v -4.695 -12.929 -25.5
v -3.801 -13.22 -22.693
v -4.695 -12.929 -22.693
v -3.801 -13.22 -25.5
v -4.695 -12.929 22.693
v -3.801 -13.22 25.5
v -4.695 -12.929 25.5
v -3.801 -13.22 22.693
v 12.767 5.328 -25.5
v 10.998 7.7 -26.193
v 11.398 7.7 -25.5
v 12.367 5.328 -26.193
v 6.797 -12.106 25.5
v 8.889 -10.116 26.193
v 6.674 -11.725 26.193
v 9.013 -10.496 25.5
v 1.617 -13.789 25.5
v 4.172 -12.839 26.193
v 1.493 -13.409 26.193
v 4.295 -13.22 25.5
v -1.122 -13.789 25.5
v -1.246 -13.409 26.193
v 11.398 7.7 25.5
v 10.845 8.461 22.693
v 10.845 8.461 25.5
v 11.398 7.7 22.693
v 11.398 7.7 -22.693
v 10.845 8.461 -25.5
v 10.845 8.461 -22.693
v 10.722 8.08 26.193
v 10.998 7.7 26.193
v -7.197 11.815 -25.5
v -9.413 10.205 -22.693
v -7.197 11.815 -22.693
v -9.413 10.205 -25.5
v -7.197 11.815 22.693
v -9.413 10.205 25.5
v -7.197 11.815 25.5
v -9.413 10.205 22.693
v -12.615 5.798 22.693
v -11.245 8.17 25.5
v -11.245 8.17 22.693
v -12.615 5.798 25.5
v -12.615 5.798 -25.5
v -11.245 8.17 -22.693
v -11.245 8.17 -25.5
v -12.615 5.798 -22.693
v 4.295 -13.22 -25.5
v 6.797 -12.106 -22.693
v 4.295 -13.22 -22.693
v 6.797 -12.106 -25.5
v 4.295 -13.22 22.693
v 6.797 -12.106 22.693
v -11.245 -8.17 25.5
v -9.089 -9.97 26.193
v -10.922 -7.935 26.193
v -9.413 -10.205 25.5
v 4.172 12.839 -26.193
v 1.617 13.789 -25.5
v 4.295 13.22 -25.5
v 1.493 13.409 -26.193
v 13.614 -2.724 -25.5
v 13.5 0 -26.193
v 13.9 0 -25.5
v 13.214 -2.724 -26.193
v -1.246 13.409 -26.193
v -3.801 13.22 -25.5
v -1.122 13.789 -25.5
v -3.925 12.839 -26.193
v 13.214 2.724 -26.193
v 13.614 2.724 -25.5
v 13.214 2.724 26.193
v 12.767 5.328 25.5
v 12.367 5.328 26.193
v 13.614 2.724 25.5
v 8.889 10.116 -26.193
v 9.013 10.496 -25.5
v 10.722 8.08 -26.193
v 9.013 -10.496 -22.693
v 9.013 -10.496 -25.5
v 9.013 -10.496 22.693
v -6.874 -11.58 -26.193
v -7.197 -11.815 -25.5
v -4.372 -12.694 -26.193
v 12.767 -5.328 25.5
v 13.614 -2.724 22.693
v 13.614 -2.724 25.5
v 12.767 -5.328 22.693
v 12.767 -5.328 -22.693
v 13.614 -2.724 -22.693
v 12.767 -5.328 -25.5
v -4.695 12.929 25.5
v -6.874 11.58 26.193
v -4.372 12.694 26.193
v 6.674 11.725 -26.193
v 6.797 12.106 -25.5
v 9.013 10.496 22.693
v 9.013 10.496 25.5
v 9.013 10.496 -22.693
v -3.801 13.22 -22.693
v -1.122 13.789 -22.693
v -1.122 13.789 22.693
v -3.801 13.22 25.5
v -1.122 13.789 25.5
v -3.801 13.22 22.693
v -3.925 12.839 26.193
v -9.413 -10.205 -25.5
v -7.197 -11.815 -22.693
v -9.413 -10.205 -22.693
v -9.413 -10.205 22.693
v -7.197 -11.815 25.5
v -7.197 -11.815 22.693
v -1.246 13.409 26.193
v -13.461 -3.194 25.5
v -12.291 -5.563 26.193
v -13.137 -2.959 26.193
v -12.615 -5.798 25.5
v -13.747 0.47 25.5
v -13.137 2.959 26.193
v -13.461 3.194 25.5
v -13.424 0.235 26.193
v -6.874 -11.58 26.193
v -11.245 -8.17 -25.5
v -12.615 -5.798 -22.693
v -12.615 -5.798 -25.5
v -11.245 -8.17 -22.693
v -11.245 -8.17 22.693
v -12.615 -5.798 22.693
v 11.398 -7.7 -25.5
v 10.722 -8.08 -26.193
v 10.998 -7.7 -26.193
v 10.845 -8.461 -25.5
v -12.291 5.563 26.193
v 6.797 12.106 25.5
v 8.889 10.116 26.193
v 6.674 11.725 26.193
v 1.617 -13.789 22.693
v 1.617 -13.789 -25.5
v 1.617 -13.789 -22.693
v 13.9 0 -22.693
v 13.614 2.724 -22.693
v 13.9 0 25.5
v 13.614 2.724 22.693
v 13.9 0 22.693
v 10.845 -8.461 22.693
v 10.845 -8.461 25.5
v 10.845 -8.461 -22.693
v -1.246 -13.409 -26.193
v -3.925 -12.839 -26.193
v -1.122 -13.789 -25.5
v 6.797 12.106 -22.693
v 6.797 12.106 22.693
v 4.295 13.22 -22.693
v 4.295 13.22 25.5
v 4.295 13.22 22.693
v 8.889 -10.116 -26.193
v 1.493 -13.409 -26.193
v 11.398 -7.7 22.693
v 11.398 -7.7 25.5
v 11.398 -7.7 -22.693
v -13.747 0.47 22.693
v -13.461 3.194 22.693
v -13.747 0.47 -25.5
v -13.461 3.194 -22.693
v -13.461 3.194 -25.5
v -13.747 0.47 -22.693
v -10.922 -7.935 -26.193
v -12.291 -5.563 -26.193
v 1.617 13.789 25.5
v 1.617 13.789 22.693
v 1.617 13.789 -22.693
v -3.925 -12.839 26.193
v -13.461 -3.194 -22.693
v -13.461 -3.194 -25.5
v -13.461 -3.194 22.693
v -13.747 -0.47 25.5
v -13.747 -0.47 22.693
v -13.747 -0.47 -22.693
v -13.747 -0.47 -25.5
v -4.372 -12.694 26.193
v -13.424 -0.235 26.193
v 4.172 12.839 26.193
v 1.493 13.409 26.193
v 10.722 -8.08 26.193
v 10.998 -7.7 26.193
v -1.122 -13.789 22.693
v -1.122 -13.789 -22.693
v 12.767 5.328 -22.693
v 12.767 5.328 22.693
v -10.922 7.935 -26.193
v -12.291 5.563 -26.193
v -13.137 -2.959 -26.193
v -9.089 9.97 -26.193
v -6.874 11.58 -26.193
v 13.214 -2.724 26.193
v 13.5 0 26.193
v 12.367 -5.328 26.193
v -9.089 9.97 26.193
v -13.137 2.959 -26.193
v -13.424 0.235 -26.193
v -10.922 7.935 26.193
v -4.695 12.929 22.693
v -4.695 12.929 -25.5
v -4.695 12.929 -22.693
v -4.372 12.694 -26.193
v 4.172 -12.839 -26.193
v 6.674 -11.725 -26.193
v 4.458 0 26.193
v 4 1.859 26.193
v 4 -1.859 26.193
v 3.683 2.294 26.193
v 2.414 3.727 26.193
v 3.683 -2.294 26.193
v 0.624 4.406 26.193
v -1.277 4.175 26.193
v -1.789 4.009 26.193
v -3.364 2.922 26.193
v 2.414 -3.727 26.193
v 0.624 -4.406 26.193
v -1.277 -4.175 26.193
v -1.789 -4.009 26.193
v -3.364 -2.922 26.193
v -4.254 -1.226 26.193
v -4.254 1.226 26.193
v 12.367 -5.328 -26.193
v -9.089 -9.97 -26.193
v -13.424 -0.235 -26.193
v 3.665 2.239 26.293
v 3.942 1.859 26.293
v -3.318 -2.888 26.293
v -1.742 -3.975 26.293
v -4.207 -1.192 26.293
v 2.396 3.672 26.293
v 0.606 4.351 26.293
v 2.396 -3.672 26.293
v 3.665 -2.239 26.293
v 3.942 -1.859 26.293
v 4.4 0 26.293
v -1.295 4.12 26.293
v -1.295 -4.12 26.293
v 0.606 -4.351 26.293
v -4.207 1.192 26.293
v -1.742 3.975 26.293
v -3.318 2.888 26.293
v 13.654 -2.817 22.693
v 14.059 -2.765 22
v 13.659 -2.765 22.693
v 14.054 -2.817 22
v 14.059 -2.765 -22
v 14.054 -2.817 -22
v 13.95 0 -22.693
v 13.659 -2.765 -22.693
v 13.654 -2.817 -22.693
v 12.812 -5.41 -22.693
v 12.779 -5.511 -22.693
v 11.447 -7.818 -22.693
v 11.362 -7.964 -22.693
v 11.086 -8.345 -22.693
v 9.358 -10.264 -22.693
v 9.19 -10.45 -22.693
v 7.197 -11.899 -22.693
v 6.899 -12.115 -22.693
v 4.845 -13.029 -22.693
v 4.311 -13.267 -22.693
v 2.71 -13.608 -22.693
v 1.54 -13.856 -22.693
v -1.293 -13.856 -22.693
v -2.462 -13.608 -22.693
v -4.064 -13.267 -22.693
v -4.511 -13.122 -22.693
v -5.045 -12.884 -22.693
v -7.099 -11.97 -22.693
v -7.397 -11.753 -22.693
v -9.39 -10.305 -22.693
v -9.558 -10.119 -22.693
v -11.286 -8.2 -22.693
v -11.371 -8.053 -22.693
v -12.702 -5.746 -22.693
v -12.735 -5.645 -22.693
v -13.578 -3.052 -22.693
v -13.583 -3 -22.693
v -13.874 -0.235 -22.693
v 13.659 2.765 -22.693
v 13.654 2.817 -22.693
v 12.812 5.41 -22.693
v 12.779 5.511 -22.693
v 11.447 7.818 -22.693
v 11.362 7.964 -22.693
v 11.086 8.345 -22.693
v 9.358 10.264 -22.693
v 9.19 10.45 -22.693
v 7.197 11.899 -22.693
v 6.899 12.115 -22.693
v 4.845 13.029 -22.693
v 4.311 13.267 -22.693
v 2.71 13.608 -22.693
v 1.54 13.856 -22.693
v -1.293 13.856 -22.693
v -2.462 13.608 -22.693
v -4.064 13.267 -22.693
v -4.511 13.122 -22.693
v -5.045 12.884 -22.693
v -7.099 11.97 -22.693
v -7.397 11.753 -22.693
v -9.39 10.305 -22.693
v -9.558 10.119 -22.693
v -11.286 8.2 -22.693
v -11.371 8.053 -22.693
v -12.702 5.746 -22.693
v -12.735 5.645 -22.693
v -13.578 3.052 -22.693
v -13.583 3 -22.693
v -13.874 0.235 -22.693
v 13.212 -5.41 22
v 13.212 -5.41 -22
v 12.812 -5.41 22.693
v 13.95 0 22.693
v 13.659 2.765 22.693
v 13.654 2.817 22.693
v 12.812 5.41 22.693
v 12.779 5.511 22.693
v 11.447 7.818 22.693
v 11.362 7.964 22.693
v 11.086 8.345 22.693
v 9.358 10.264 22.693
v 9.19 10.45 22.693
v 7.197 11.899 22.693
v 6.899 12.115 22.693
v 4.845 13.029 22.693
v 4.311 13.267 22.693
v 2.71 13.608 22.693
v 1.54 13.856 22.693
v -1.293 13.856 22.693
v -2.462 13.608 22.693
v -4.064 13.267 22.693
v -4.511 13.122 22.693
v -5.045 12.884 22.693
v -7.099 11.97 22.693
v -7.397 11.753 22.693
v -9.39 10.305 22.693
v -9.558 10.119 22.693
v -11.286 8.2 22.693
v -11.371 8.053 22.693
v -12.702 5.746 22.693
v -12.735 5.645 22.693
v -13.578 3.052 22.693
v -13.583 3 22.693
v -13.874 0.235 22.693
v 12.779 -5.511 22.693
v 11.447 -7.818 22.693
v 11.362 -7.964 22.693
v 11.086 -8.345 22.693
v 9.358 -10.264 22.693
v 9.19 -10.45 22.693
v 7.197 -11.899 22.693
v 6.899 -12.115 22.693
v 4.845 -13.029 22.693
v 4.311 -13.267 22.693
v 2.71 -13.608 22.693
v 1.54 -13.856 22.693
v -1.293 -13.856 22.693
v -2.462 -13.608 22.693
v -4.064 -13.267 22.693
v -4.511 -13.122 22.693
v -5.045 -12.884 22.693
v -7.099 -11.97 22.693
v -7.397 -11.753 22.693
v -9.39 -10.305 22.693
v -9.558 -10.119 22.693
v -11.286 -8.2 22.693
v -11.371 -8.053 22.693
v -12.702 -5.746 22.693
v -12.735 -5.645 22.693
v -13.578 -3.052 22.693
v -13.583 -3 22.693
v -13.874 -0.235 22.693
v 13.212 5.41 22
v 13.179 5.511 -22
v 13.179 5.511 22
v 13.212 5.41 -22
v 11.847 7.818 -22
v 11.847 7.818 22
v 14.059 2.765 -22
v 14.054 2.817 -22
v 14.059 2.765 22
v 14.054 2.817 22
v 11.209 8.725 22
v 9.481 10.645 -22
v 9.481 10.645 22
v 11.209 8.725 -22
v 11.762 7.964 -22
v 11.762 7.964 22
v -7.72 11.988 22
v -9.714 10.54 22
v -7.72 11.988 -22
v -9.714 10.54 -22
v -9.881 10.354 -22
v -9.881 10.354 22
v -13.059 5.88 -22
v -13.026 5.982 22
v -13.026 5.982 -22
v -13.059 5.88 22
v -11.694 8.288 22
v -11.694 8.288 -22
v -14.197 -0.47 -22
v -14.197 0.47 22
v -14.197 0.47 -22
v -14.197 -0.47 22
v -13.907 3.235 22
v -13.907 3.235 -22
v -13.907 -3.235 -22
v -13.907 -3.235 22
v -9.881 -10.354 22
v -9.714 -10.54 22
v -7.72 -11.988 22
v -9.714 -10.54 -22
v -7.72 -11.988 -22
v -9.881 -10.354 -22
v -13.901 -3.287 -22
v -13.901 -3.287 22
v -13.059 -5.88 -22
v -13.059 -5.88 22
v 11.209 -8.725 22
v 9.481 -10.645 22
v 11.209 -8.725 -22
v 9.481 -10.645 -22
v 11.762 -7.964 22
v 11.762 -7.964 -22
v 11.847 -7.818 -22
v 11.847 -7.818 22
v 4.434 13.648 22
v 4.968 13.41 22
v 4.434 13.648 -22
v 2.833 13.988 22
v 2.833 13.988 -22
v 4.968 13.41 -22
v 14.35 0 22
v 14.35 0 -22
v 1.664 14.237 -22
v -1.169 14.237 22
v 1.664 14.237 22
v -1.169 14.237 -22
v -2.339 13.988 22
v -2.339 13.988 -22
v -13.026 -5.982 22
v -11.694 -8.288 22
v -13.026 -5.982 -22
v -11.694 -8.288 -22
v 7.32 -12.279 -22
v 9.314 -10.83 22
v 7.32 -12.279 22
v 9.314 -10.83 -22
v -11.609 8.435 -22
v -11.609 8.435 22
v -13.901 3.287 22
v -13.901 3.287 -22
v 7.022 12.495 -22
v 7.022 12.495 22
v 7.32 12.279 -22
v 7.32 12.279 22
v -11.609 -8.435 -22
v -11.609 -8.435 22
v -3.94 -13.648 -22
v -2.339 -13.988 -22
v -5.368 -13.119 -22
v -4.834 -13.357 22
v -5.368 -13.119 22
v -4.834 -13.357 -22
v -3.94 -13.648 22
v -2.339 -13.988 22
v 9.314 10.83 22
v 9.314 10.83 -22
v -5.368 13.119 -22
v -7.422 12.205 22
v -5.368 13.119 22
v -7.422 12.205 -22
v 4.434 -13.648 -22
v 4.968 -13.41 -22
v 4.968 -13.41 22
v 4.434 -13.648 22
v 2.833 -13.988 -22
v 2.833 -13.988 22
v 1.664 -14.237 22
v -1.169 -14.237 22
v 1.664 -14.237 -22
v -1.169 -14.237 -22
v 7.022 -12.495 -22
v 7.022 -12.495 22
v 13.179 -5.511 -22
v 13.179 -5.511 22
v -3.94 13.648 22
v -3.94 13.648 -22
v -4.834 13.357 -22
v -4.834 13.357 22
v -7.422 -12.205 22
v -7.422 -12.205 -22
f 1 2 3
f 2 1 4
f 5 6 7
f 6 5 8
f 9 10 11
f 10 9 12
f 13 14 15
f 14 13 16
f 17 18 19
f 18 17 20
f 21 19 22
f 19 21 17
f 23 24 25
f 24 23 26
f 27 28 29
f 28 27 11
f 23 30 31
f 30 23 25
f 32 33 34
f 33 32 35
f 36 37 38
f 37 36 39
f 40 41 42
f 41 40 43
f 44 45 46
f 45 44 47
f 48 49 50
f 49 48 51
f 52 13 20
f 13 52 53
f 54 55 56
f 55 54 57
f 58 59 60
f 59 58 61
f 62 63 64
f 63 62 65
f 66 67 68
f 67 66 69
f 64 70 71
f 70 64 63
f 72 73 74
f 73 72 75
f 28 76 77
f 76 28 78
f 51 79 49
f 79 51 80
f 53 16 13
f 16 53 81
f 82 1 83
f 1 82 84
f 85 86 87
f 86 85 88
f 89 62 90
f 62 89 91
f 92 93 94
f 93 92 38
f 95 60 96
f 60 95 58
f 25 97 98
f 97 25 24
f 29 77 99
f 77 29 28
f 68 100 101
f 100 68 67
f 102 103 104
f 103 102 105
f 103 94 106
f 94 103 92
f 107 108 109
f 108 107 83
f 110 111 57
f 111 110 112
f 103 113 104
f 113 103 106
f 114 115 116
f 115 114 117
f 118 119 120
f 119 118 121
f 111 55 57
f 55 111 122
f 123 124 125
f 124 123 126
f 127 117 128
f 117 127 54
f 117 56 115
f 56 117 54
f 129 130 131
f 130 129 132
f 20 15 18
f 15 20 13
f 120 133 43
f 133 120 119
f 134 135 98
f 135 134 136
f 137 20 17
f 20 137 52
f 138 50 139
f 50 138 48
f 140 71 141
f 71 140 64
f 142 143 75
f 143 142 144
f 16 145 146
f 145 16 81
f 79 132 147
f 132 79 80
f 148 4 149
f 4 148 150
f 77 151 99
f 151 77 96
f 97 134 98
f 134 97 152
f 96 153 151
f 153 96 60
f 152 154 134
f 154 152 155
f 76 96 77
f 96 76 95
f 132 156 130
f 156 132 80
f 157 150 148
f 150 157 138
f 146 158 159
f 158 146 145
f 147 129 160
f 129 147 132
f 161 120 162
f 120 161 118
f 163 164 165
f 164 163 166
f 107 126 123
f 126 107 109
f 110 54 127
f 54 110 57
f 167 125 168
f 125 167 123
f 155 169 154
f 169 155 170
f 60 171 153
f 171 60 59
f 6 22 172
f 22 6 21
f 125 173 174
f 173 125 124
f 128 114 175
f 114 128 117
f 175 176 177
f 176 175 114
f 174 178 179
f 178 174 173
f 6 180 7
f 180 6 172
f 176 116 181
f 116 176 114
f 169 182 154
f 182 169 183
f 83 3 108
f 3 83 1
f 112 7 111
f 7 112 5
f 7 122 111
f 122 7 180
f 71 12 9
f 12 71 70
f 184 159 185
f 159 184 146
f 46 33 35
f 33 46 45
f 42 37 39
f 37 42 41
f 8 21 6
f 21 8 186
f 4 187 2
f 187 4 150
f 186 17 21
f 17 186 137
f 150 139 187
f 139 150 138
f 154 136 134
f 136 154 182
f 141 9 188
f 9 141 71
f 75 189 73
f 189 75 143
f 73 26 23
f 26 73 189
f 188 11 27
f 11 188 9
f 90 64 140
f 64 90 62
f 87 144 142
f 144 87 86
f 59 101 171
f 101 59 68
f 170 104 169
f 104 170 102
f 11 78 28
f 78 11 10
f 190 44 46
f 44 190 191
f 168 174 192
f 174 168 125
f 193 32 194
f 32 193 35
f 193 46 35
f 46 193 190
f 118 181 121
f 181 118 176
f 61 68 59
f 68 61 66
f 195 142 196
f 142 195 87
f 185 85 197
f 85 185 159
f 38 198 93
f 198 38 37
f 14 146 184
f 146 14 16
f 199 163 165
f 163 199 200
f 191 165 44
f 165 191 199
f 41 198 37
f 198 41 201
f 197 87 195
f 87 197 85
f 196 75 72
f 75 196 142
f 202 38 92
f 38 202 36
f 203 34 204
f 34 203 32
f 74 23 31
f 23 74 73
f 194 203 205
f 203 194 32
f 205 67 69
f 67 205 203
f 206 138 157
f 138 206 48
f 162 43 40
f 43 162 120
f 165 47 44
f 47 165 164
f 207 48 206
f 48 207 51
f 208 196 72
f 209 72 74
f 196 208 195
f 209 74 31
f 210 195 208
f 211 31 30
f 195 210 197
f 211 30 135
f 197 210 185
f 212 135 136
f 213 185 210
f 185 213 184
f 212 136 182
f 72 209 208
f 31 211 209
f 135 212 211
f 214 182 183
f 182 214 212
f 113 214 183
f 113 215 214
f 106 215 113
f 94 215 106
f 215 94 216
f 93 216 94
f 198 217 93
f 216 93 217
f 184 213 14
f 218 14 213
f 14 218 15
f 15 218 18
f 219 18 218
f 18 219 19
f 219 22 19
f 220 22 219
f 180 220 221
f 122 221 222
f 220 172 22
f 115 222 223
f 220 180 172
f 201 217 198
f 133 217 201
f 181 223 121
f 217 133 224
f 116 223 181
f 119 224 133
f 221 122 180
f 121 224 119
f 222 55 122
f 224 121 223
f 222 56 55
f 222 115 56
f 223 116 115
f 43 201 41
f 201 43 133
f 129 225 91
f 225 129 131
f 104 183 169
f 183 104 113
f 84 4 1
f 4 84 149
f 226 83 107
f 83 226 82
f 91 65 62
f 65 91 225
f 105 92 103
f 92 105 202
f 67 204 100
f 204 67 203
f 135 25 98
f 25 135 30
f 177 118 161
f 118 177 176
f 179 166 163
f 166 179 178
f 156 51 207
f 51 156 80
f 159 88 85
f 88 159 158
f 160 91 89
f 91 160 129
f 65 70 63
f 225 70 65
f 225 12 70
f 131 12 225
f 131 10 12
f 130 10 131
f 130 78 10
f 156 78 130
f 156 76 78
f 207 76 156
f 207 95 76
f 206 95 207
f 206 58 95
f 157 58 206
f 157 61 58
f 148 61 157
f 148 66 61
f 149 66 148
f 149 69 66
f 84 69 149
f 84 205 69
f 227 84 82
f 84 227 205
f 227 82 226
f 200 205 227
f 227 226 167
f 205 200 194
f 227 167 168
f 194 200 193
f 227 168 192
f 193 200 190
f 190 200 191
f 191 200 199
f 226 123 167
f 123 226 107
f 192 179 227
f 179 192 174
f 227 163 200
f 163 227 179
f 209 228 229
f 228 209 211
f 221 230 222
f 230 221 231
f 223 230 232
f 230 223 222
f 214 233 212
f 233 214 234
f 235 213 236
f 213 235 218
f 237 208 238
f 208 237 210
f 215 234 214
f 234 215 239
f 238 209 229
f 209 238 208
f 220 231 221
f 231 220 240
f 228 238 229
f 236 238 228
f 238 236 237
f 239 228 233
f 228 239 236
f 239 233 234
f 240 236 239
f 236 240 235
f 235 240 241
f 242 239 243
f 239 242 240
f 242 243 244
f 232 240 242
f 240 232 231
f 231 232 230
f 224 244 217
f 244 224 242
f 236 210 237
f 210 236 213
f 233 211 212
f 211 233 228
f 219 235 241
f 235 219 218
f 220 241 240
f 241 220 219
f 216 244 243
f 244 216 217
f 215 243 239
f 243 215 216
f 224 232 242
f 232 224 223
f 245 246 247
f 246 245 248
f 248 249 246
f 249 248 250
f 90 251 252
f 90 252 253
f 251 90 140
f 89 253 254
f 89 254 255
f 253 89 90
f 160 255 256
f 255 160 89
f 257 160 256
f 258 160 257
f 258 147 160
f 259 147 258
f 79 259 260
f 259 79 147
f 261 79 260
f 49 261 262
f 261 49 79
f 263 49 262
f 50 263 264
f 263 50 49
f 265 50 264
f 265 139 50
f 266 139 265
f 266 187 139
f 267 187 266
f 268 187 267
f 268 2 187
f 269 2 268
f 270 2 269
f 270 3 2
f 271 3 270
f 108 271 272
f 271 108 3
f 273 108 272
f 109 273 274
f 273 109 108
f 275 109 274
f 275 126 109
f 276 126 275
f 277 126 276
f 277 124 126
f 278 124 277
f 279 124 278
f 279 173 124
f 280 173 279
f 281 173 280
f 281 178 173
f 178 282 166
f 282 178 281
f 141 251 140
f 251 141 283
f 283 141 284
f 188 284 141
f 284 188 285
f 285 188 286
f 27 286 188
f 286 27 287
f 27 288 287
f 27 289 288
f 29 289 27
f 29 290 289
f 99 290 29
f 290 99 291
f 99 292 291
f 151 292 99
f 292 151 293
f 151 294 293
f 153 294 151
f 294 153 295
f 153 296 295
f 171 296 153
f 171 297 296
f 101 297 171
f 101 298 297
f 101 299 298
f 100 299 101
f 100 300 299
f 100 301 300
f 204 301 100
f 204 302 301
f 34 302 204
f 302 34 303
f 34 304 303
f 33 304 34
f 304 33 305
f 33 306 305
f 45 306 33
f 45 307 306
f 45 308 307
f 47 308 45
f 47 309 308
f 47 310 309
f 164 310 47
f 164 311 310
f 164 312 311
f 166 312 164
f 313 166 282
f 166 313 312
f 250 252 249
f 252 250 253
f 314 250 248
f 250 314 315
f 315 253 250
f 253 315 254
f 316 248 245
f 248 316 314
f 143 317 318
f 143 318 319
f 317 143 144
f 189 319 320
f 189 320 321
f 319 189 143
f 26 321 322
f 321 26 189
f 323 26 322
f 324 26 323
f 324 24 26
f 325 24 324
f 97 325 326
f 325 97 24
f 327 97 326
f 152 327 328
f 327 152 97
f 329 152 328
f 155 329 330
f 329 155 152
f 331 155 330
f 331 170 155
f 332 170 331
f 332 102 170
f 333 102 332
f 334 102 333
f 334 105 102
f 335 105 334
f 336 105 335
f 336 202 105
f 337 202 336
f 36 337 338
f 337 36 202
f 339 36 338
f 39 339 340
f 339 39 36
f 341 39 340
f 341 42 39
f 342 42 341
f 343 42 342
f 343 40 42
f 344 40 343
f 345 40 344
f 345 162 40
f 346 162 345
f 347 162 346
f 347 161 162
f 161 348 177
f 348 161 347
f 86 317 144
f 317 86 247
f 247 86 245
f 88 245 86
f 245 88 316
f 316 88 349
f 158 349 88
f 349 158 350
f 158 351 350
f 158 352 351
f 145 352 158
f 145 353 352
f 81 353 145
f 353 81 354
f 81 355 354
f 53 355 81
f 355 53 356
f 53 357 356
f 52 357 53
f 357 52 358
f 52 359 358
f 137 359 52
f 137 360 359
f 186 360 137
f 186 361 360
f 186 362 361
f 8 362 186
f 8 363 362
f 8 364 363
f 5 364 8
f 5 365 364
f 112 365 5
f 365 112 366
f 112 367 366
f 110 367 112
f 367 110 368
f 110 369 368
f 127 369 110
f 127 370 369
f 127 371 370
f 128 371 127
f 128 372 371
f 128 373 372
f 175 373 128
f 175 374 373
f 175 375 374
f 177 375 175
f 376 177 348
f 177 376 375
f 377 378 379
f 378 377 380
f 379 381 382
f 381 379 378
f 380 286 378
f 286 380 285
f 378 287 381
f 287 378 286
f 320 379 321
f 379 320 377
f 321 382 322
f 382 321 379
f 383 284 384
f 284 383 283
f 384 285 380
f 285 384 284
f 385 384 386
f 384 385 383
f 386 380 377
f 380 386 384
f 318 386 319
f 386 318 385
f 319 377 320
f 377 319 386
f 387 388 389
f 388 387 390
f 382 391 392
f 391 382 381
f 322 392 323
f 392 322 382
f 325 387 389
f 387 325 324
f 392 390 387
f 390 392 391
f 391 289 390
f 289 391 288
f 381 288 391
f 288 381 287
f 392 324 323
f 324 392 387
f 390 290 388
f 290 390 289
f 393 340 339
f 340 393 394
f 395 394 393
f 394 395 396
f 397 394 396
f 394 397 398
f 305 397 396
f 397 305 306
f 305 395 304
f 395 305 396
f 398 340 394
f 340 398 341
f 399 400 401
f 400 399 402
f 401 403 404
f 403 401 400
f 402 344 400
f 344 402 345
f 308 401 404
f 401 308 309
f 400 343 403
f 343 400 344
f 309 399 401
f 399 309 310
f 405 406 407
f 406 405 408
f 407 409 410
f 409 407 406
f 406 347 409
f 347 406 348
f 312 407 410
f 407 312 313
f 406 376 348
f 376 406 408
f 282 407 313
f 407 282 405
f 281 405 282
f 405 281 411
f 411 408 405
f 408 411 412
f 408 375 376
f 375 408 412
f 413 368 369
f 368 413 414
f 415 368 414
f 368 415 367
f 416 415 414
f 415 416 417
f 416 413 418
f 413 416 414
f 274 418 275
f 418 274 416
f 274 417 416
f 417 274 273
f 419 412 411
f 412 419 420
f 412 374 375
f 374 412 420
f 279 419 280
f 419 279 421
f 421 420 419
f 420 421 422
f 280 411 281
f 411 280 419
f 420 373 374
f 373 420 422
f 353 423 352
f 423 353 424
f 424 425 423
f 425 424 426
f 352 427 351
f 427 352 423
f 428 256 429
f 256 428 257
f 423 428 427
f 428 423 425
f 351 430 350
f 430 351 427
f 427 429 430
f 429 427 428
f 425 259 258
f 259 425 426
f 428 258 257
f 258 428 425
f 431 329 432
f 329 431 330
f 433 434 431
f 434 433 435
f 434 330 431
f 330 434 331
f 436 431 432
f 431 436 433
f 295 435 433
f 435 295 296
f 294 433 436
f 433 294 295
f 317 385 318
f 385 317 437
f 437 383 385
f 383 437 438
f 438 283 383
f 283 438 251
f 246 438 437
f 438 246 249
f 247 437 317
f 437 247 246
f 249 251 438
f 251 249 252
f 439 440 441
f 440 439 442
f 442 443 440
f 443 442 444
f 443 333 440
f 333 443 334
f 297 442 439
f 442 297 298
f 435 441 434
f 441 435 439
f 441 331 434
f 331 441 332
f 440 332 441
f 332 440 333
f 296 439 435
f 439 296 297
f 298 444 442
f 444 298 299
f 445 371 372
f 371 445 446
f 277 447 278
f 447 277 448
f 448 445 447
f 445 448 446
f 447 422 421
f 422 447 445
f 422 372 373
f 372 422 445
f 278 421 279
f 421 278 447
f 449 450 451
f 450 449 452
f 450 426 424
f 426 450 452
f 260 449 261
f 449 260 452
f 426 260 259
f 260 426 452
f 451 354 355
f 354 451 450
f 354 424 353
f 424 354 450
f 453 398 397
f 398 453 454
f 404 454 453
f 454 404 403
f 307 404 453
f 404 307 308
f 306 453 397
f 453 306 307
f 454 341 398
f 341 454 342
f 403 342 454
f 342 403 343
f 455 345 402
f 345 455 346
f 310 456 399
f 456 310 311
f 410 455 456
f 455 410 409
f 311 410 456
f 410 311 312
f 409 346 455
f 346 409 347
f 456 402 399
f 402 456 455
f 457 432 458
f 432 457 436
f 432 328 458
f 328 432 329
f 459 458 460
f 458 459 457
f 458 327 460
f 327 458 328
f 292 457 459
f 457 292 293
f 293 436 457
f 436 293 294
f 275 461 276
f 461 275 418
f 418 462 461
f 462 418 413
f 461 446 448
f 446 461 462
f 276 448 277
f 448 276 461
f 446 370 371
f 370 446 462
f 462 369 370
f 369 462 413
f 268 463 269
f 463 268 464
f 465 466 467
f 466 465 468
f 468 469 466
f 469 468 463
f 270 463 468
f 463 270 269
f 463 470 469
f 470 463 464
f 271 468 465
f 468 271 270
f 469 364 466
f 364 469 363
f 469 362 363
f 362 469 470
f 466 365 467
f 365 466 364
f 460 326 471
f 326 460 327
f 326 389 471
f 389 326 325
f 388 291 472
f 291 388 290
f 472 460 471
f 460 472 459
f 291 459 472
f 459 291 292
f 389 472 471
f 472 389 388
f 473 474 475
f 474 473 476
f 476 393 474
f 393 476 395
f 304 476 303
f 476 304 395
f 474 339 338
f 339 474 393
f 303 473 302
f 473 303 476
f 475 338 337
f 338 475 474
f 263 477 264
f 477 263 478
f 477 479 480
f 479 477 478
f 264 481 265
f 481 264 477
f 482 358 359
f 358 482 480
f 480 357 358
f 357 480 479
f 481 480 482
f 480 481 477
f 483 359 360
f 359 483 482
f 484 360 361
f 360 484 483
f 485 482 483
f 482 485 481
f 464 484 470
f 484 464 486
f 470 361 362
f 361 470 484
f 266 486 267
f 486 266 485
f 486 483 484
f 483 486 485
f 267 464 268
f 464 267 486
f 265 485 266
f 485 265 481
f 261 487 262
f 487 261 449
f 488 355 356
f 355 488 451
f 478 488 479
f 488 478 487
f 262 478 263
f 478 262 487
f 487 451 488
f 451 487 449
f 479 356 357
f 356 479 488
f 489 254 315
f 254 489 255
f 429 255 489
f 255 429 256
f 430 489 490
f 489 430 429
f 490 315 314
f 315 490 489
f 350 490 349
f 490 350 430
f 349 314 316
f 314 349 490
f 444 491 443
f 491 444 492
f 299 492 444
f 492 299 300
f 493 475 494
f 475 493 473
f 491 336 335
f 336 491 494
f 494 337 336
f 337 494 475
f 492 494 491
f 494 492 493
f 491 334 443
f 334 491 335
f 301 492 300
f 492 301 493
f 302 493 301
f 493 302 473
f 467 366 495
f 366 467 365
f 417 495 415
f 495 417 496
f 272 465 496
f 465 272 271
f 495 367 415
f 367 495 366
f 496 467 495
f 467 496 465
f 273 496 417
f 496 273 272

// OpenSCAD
// Parameters
cell_height = 50.0; //[25.0:100.0:0.1]
cell_diameter = 26.2; //[13.1:52.4:0.1]
overlap = 1.0; //[0.5:2.0:0.1]
face_thickness = 0.8; //[0.4:2.0:0.1]
terminal_diameter = 8.0; //[4.0:16.0:0.1]
terminal_height = 1.6; //[0.8:4.0:0.1]
insulator_outer_diameter = 18.0; //[9.0:30.0:0.1]
insulator_inner_diameter = 10.0; //[5.0:20.0:0.1]
insulator_thickness = 0.6; //[0.3:2.0:0.1]
fillet_radius = 0.8; //[0.4:2.5:0.1]
label_thickness = 0.25; //[0.1:0.8:0.05]
label_height = 44.0; //[20.0:90.0:0.5]
label_clearance = 0.2; //[0.0:1.0:0.05]

// Base Shapes
module cell_body() {
  color("DimGray")
  cylinder(h=cell_height, r=cell_diameter/2, center=true);
}

module top_face() {
  color("Silver")
  translate([0, 0, cell_height/2 - face_thickness/2 + overlap/2])
    cylinder(h=face_thickness, r=cell_diameter/2, center=true);
}

module bottom_face() {
  color("Silver")
  translate([0, 0, -cell_height/2 + face_thickness/2 - overlap/2])
    cylinder(h=face_thickness, r=cell_diameter/2, center=true);
}

module positive_terminal_button() {
  color("Silver")
  translate([0, 0, cell_height/2 + terminal_height/2 - overlap])
    cylinder(h=terminal_height, r=terminal_diameter/2, center=true);
}

module insulator_outer_disc() {
  translate([0, 0, cell_height/2 + insulator_thickness/2 - overlap])
    cylinder(h=insulator_thickness, r=insulator_outer_diameter/2, center=true);
}

module insulator_inner_hole() {
  translate([0, 0, cell_height/2 + insulator_thickness/2 - overlap])
    cylinder(h=insulator_thickness + 2*overlap, r=insulator_inner_diameter/2, center=true);
}

module label_outer_sleeve() {
  color("Blue")
  cylinder(h=label_height, r=cell_diameter/2 + label_clearance + label_thickness, center=true);
}

module label_inner_void() {
  cylinder(h=label_height + 2*overlap, r=cell_diameter/2 + label_clearance, center=true);
}

module fillet_sphere() {
  sphere(r=fillet_radius);
}

// Operations
module top_insulator_ring() {
  difference() {
    insulator_outer_disc();
    insulator_inner_hole();
  }
}

module label_wrap() {
  difference() {
    label_outer_sleeve();
    label_inner_void();
  }
}

module cell_core_union() {
  union() {
    cell_body();
    top_face();
    bottom_face();
    positive_terminal_button();
    top_insulator_ring();
  }
}

module cell_with_label_union() {
  union() {
    cell_core_union();
    label_wrap();
  }
}

// Final Output
minkowski() {
  cell_with_label_union();
  fillet_sphere();
}
